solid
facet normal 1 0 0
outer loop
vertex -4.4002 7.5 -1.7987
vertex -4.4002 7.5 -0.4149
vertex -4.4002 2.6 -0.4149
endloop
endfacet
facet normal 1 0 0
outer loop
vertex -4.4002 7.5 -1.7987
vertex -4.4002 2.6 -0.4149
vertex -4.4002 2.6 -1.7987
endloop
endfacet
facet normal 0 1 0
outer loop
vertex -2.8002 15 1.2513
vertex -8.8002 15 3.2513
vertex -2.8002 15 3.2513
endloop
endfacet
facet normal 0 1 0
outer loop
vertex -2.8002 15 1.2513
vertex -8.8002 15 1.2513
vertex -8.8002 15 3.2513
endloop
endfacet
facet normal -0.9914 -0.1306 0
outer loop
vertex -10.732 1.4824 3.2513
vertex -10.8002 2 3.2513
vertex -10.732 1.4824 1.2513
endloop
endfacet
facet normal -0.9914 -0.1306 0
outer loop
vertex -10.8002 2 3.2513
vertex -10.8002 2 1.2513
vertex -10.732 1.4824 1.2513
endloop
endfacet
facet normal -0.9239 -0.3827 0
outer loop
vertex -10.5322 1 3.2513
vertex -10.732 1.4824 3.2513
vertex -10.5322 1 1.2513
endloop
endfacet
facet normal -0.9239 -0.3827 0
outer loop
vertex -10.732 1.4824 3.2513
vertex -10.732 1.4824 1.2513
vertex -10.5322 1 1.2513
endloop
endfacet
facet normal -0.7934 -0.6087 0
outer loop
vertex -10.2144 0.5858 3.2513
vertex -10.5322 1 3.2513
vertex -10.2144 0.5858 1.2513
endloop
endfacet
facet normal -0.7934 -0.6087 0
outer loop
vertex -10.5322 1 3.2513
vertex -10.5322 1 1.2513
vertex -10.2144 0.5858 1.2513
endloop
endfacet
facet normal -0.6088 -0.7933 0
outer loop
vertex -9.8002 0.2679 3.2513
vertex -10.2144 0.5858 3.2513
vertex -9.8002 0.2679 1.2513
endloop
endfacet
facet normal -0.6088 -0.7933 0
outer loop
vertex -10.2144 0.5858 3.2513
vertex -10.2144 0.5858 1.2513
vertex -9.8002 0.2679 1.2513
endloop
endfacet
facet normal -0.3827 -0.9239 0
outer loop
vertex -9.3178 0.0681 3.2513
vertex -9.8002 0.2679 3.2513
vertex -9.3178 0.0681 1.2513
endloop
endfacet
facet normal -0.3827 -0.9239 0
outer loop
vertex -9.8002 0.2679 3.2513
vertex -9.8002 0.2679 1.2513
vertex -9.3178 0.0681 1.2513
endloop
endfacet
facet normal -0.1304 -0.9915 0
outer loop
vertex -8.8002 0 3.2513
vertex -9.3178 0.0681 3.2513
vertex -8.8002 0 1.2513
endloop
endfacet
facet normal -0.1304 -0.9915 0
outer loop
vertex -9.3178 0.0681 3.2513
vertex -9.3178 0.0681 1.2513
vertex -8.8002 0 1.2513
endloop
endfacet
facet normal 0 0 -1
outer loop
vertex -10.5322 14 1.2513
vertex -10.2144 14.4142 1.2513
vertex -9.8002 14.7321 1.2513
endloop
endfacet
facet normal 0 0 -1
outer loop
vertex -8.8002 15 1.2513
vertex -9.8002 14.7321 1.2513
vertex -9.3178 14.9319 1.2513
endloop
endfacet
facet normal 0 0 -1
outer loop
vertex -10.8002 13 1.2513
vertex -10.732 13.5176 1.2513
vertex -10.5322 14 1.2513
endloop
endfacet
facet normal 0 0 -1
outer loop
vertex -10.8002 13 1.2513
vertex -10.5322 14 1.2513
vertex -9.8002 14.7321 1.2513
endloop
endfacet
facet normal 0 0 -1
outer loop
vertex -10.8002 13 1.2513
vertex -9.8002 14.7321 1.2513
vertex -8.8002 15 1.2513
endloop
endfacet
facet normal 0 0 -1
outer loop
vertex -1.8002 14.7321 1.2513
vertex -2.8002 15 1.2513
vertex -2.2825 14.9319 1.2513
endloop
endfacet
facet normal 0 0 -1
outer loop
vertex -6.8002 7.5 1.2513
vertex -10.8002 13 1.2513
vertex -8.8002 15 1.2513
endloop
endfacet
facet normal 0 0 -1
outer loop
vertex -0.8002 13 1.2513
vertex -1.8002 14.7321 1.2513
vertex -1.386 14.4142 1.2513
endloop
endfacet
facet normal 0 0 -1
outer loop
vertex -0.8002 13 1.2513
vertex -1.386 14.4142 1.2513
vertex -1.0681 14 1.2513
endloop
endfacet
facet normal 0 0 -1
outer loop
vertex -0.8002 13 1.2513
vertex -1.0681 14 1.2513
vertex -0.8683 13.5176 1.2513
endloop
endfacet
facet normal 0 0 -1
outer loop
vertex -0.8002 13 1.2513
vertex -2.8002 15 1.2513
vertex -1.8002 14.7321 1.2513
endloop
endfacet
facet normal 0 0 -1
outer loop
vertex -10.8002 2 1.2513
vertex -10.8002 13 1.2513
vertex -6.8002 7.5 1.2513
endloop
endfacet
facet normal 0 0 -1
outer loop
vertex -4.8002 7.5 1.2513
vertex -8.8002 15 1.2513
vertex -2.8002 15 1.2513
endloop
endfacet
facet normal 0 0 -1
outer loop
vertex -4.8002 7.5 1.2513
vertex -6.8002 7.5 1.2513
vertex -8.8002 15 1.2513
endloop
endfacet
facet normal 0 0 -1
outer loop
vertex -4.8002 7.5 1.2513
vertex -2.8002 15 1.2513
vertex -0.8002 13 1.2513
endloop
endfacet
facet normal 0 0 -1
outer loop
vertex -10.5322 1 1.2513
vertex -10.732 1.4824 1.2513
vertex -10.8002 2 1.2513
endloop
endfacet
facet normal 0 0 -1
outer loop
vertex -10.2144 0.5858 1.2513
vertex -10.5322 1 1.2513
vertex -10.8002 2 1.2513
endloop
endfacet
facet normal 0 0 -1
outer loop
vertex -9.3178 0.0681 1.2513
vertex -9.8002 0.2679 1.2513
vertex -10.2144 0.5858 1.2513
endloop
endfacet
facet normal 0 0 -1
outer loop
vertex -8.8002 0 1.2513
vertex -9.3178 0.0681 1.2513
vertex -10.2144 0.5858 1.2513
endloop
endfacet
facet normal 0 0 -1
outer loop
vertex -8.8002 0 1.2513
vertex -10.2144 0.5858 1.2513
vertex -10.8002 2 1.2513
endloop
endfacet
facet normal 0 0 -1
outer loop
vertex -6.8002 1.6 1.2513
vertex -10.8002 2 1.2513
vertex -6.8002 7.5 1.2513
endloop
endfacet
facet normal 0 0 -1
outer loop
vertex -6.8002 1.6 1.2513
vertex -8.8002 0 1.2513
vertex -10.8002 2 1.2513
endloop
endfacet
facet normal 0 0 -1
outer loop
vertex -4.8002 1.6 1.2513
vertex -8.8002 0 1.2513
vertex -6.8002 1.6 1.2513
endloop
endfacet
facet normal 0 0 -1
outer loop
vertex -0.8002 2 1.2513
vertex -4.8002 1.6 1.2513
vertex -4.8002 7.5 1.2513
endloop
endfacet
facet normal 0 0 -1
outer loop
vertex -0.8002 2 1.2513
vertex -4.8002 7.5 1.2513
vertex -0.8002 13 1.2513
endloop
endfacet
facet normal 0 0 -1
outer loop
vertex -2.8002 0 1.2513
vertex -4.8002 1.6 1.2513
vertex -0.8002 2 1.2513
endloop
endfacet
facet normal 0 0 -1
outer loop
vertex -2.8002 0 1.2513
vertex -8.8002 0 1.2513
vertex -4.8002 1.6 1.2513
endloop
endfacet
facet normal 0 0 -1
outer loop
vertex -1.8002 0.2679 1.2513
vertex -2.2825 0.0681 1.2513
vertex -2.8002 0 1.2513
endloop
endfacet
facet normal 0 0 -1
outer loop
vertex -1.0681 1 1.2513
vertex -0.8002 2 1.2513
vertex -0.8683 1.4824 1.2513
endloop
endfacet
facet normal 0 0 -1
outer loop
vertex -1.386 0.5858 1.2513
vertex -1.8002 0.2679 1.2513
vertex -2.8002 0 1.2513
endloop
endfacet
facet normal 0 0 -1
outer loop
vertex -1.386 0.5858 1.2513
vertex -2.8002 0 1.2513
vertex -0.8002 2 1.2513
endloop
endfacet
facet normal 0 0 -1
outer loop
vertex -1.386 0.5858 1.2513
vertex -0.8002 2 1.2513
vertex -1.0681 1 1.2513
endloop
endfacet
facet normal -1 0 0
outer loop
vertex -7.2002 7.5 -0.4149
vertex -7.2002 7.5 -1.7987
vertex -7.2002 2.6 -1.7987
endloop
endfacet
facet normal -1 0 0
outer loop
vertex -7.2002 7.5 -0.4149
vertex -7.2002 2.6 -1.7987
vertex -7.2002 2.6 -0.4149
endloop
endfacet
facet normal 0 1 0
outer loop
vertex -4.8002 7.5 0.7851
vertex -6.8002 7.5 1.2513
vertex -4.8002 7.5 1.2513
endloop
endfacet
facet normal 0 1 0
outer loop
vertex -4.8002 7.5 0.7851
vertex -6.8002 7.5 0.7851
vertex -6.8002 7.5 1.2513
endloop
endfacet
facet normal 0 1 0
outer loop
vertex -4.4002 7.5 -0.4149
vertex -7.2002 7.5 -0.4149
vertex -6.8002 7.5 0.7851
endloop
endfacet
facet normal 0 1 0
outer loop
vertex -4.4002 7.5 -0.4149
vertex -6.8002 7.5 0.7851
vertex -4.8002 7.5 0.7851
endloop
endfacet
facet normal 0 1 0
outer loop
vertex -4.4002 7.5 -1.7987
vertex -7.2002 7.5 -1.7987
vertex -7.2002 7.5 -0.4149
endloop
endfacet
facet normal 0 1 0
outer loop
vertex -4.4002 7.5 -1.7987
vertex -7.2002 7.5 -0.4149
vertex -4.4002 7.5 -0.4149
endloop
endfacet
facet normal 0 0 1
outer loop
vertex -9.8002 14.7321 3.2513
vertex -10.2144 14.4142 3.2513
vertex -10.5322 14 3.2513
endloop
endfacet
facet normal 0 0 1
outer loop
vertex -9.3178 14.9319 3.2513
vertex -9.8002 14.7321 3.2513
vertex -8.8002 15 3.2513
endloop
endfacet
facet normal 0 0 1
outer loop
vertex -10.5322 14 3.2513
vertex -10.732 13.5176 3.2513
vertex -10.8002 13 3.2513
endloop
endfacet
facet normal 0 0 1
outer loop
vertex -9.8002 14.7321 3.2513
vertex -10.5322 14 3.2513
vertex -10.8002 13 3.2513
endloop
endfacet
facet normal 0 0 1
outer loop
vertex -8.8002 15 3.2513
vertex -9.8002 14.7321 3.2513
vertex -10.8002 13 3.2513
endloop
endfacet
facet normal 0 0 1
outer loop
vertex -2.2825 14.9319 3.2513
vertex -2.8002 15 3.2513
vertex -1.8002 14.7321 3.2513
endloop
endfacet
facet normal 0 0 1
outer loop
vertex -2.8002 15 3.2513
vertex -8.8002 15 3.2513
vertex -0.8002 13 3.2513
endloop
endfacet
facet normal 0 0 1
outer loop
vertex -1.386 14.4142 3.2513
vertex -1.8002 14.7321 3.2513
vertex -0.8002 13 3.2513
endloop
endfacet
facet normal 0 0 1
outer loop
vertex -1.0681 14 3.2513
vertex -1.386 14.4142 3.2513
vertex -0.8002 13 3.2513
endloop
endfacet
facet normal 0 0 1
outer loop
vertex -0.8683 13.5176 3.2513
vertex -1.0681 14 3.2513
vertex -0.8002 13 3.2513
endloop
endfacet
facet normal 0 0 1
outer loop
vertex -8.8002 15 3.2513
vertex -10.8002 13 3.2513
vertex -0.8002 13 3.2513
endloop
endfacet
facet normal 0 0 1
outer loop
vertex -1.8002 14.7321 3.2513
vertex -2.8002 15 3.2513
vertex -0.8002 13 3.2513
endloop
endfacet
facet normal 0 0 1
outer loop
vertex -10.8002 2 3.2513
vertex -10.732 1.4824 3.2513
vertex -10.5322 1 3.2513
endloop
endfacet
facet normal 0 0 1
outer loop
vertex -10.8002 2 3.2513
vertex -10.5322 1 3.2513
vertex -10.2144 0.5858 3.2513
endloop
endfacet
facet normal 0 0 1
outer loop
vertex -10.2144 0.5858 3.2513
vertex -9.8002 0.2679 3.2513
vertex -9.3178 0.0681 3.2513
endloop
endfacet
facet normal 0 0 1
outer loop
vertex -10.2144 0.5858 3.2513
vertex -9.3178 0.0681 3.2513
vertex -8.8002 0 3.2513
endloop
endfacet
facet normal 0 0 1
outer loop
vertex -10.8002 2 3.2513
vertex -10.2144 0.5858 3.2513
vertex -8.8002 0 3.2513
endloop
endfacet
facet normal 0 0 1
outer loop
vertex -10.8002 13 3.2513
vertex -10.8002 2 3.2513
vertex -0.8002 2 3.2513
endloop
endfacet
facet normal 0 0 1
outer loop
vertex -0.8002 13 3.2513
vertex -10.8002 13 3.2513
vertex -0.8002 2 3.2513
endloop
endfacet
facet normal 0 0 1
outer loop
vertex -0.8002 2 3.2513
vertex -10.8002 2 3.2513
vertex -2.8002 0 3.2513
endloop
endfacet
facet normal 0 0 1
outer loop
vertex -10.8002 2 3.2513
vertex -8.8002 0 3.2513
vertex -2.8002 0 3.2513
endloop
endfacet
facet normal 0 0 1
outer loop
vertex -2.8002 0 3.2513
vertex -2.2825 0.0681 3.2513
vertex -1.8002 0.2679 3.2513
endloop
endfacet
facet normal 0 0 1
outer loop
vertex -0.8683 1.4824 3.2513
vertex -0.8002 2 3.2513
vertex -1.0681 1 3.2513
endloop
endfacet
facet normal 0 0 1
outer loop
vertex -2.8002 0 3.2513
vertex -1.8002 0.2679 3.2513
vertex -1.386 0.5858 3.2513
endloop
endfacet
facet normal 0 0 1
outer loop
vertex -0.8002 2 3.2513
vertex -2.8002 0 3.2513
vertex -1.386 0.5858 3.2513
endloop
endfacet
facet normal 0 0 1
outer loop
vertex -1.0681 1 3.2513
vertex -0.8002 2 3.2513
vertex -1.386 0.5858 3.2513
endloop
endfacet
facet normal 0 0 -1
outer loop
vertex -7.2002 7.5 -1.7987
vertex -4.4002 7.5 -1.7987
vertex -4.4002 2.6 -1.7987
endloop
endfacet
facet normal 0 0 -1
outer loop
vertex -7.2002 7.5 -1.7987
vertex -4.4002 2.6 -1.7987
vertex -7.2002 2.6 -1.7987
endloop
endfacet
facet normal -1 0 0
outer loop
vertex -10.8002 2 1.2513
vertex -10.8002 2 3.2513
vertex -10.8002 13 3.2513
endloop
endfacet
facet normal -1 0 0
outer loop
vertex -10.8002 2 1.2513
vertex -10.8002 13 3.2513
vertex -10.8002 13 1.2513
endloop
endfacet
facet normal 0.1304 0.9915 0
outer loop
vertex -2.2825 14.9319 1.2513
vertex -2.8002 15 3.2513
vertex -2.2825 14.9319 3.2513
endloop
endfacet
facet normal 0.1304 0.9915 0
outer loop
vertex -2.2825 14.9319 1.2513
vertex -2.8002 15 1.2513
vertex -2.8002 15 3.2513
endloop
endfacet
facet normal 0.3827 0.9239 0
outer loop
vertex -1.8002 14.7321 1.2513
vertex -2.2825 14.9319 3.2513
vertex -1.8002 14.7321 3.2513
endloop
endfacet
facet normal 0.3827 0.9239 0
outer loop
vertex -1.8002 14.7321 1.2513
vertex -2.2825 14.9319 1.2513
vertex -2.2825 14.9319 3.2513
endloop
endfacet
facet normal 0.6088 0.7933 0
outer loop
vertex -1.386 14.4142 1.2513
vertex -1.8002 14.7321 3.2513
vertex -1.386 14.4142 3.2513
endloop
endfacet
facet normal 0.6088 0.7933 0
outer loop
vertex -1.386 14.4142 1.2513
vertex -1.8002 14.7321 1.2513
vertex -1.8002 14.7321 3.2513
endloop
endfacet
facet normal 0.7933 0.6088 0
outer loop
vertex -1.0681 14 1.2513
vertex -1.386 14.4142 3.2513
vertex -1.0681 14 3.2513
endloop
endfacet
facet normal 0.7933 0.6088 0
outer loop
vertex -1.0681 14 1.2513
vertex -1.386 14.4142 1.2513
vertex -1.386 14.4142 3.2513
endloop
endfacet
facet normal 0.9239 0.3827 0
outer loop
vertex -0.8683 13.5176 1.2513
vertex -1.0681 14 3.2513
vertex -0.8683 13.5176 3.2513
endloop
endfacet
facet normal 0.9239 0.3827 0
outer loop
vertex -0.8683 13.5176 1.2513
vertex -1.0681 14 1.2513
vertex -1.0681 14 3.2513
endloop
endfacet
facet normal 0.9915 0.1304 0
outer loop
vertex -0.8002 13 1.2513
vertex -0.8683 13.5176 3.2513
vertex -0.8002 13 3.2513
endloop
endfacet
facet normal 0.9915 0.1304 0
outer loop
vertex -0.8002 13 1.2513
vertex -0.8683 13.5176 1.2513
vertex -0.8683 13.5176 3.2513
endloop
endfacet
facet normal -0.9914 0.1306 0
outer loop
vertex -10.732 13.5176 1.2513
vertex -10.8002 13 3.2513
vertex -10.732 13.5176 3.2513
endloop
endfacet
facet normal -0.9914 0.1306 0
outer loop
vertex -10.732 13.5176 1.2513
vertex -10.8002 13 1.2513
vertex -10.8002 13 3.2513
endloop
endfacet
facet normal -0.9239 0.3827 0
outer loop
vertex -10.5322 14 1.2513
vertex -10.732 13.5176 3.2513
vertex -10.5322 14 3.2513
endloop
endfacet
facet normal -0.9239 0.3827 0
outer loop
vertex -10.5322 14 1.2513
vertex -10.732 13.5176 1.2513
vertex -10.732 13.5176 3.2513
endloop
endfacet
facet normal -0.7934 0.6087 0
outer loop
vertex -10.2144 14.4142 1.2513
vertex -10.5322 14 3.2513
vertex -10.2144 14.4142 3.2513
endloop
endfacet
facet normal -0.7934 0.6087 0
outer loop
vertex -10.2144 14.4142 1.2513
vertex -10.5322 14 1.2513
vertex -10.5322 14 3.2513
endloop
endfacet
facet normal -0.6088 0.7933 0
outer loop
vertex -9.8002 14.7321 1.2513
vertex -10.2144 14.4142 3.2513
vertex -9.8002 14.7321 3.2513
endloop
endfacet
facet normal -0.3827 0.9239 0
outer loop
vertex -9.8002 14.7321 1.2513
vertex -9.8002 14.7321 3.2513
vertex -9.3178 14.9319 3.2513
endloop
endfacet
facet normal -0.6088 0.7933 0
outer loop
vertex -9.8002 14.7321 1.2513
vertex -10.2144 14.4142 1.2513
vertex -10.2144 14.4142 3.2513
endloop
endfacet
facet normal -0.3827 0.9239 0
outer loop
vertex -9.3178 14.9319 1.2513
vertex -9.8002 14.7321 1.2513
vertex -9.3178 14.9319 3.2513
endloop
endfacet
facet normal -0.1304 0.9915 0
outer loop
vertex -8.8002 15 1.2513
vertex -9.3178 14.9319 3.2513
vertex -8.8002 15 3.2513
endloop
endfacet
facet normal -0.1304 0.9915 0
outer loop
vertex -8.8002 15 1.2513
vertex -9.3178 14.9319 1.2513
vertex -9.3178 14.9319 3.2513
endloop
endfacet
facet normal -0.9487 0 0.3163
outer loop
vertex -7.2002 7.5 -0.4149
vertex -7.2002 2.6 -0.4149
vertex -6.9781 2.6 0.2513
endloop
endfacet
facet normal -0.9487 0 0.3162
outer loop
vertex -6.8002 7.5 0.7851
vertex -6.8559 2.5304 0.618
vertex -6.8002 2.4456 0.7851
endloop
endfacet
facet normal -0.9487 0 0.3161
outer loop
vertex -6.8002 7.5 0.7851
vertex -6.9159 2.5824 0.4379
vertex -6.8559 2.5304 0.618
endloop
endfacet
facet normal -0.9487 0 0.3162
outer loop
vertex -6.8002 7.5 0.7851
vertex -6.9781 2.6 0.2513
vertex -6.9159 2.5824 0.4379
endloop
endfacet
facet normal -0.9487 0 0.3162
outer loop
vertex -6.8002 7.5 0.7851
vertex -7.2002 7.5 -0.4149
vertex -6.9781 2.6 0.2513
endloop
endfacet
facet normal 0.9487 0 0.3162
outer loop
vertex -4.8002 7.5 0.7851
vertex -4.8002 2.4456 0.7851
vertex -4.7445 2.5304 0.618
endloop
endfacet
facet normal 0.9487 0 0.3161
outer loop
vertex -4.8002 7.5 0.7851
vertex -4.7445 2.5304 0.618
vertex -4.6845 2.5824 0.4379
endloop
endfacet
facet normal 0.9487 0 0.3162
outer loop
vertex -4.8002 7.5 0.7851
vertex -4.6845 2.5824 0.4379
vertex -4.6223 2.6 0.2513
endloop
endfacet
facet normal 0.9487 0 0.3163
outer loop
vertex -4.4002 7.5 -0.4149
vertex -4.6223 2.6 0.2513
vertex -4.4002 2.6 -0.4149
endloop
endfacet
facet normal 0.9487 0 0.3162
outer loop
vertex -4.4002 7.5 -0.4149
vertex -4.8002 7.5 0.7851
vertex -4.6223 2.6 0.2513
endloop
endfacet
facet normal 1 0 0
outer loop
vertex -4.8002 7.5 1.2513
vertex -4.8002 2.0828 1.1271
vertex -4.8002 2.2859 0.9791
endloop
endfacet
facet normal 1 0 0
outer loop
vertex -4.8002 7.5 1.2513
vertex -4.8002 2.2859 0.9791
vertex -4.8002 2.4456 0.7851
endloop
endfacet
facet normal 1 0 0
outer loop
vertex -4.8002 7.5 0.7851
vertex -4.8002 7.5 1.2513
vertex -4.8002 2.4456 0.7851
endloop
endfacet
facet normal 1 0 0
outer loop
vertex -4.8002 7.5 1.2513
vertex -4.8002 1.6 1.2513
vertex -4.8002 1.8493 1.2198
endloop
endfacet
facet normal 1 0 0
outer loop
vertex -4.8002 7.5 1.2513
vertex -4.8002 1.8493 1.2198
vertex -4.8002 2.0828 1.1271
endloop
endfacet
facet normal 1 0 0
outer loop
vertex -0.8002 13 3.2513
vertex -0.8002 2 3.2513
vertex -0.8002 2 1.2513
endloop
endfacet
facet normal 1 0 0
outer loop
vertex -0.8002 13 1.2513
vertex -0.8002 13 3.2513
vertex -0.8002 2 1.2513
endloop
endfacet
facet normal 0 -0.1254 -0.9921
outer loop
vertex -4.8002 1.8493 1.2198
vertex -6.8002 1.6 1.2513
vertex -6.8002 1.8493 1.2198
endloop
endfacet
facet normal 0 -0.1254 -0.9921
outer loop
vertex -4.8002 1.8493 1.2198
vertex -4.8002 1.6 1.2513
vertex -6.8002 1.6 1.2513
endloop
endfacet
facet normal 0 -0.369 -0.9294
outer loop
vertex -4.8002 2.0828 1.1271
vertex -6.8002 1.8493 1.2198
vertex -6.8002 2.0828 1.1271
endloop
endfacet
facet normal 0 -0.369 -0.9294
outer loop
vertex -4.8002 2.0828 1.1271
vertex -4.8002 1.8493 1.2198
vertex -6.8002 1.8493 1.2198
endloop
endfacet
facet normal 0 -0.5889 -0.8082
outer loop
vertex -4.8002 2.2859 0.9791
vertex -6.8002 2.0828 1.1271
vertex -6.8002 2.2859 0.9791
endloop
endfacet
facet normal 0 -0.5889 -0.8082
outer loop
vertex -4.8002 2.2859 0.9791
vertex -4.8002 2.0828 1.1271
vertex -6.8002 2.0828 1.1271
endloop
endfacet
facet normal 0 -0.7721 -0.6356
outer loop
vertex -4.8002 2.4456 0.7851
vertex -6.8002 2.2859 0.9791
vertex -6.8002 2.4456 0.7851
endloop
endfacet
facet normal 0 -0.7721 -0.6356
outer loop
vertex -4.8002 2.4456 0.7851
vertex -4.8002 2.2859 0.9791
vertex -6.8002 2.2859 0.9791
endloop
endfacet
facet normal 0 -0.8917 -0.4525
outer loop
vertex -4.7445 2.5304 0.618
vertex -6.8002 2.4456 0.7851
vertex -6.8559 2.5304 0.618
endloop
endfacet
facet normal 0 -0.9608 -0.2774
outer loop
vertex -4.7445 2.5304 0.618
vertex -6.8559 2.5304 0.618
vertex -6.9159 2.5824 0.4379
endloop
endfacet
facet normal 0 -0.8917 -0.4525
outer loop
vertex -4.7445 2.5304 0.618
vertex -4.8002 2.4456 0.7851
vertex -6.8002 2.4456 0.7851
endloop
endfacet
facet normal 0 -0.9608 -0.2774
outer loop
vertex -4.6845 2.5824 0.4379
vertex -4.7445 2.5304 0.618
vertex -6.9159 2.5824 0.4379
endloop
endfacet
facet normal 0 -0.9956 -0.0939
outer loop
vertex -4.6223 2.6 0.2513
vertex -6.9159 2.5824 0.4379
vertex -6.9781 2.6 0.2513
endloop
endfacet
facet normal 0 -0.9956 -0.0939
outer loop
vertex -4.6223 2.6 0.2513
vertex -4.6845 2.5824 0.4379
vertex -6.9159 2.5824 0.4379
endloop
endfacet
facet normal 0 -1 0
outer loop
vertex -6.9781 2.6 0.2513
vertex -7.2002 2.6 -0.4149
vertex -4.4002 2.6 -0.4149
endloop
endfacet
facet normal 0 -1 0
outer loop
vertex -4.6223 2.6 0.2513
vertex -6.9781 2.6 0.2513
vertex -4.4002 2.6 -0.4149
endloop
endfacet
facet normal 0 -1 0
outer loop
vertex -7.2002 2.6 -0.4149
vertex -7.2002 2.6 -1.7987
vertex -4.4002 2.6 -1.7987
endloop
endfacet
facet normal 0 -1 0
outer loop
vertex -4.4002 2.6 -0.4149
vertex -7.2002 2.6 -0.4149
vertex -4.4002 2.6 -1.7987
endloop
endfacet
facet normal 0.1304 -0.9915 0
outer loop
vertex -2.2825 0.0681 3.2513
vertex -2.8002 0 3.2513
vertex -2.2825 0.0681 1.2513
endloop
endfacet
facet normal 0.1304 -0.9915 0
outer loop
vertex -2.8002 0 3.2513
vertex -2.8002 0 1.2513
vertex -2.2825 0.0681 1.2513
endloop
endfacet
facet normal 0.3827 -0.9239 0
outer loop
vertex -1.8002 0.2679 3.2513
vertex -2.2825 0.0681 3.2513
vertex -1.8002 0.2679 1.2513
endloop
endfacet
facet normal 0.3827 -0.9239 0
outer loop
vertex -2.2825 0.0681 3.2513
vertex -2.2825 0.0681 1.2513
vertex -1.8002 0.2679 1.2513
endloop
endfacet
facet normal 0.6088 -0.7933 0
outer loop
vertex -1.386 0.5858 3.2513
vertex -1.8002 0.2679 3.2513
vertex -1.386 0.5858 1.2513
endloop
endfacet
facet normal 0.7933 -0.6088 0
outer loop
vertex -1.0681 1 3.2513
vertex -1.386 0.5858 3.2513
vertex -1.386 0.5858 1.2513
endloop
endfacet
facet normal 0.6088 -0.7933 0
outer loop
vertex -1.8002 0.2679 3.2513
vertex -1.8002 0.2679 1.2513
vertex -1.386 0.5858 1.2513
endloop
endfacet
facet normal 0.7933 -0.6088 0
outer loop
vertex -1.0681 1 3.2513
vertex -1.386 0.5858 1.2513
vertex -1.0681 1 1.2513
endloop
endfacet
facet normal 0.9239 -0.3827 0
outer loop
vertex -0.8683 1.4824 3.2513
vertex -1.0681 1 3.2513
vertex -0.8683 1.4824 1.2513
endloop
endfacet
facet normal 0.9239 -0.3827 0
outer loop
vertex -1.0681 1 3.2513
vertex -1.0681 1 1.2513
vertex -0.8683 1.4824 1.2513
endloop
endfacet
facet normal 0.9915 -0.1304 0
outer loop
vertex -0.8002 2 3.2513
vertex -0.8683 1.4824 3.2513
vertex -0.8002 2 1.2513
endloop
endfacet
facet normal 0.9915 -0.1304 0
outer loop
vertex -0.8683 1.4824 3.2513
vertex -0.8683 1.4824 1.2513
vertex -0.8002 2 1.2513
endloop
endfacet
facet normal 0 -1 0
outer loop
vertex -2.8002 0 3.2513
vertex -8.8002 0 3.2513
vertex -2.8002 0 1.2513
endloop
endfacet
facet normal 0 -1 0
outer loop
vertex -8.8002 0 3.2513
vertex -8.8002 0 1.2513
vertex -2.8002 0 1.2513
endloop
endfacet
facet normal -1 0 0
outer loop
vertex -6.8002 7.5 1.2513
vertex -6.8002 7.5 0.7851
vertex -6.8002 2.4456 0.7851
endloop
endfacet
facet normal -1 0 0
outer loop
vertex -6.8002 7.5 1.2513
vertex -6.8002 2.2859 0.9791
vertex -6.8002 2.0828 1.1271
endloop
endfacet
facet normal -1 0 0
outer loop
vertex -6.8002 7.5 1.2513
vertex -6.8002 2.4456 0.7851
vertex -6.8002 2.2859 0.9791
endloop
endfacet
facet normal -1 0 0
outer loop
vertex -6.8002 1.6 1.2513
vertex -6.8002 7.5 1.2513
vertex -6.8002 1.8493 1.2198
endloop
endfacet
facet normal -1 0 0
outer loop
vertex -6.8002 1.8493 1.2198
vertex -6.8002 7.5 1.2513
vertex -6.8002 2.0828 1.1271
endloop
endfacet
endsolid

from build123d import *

# Parameters (mm, degrees)
SKETCH2_W           = 10
SKETCH2_H           = 2
BOSS_EXTRUDE1_DEPTH = 15
BOSS_EXTRUDE2_DEPTH = 4.9
FILLET1_R           = 2
FILLET2_R           = 1


with BuildPart() as part:
    # Sketch2 → Boss-Extrude1 (new body)
    with BuildSketch(Plane(origin=(0, 0, 0), x_dir=(1, 0, 0), z_dir=(0, 1, 0))):
        with Locations((-5.80018665, -2.25133902)):
            Rectangle(SKETCH2_W, SKETCH2_H)
    extrude(amount=BOSS_EXTRUDE1_DEPTH)

    # Sketch3 → Boss-Extrude2 (add)
    with BuildSketch(Plane(origin=(0, 7.5, 0), x_dir=(-1, 0, 0), z_dir=(0, -1, 0))):
        Polygon((4.80018665, -1.437939643), (4.80018665, -0.785111254), (4.40018665, 0.414888746), (4.40018665, 1.79866098), (7.20018665, 1.79866098), (7.20018665, 0.414888746), (6.80018665, -0.785111254), (6.80018665, -1.437939643), align=None)
    extrude(amount=BOSS_EXTRUDE2_DEPTH)

    # Fillet1
    fillet1_edges = [part.edges().sort_by_distance(p)[0] for p in [
        (-10.80018665, 15, 2.25133902),
        (-0.80018665, 15, 2.25133902),
        (-10.80018665, 0, 2.25133902),
        (-0.80018665, 0, 2.25133902),
    ]]
    fillet(fillet1_edges, radius=FILLET1_R)

    # Fillet2
    fillet2_edges = [part.edges().sort_by_distance(p)[0] for p in [
        (-5.80018665, 2.6, 1.25133902),
    ]]
    fillet(fillet2_edges, radius=FILLET2_R)


solid = part.part
